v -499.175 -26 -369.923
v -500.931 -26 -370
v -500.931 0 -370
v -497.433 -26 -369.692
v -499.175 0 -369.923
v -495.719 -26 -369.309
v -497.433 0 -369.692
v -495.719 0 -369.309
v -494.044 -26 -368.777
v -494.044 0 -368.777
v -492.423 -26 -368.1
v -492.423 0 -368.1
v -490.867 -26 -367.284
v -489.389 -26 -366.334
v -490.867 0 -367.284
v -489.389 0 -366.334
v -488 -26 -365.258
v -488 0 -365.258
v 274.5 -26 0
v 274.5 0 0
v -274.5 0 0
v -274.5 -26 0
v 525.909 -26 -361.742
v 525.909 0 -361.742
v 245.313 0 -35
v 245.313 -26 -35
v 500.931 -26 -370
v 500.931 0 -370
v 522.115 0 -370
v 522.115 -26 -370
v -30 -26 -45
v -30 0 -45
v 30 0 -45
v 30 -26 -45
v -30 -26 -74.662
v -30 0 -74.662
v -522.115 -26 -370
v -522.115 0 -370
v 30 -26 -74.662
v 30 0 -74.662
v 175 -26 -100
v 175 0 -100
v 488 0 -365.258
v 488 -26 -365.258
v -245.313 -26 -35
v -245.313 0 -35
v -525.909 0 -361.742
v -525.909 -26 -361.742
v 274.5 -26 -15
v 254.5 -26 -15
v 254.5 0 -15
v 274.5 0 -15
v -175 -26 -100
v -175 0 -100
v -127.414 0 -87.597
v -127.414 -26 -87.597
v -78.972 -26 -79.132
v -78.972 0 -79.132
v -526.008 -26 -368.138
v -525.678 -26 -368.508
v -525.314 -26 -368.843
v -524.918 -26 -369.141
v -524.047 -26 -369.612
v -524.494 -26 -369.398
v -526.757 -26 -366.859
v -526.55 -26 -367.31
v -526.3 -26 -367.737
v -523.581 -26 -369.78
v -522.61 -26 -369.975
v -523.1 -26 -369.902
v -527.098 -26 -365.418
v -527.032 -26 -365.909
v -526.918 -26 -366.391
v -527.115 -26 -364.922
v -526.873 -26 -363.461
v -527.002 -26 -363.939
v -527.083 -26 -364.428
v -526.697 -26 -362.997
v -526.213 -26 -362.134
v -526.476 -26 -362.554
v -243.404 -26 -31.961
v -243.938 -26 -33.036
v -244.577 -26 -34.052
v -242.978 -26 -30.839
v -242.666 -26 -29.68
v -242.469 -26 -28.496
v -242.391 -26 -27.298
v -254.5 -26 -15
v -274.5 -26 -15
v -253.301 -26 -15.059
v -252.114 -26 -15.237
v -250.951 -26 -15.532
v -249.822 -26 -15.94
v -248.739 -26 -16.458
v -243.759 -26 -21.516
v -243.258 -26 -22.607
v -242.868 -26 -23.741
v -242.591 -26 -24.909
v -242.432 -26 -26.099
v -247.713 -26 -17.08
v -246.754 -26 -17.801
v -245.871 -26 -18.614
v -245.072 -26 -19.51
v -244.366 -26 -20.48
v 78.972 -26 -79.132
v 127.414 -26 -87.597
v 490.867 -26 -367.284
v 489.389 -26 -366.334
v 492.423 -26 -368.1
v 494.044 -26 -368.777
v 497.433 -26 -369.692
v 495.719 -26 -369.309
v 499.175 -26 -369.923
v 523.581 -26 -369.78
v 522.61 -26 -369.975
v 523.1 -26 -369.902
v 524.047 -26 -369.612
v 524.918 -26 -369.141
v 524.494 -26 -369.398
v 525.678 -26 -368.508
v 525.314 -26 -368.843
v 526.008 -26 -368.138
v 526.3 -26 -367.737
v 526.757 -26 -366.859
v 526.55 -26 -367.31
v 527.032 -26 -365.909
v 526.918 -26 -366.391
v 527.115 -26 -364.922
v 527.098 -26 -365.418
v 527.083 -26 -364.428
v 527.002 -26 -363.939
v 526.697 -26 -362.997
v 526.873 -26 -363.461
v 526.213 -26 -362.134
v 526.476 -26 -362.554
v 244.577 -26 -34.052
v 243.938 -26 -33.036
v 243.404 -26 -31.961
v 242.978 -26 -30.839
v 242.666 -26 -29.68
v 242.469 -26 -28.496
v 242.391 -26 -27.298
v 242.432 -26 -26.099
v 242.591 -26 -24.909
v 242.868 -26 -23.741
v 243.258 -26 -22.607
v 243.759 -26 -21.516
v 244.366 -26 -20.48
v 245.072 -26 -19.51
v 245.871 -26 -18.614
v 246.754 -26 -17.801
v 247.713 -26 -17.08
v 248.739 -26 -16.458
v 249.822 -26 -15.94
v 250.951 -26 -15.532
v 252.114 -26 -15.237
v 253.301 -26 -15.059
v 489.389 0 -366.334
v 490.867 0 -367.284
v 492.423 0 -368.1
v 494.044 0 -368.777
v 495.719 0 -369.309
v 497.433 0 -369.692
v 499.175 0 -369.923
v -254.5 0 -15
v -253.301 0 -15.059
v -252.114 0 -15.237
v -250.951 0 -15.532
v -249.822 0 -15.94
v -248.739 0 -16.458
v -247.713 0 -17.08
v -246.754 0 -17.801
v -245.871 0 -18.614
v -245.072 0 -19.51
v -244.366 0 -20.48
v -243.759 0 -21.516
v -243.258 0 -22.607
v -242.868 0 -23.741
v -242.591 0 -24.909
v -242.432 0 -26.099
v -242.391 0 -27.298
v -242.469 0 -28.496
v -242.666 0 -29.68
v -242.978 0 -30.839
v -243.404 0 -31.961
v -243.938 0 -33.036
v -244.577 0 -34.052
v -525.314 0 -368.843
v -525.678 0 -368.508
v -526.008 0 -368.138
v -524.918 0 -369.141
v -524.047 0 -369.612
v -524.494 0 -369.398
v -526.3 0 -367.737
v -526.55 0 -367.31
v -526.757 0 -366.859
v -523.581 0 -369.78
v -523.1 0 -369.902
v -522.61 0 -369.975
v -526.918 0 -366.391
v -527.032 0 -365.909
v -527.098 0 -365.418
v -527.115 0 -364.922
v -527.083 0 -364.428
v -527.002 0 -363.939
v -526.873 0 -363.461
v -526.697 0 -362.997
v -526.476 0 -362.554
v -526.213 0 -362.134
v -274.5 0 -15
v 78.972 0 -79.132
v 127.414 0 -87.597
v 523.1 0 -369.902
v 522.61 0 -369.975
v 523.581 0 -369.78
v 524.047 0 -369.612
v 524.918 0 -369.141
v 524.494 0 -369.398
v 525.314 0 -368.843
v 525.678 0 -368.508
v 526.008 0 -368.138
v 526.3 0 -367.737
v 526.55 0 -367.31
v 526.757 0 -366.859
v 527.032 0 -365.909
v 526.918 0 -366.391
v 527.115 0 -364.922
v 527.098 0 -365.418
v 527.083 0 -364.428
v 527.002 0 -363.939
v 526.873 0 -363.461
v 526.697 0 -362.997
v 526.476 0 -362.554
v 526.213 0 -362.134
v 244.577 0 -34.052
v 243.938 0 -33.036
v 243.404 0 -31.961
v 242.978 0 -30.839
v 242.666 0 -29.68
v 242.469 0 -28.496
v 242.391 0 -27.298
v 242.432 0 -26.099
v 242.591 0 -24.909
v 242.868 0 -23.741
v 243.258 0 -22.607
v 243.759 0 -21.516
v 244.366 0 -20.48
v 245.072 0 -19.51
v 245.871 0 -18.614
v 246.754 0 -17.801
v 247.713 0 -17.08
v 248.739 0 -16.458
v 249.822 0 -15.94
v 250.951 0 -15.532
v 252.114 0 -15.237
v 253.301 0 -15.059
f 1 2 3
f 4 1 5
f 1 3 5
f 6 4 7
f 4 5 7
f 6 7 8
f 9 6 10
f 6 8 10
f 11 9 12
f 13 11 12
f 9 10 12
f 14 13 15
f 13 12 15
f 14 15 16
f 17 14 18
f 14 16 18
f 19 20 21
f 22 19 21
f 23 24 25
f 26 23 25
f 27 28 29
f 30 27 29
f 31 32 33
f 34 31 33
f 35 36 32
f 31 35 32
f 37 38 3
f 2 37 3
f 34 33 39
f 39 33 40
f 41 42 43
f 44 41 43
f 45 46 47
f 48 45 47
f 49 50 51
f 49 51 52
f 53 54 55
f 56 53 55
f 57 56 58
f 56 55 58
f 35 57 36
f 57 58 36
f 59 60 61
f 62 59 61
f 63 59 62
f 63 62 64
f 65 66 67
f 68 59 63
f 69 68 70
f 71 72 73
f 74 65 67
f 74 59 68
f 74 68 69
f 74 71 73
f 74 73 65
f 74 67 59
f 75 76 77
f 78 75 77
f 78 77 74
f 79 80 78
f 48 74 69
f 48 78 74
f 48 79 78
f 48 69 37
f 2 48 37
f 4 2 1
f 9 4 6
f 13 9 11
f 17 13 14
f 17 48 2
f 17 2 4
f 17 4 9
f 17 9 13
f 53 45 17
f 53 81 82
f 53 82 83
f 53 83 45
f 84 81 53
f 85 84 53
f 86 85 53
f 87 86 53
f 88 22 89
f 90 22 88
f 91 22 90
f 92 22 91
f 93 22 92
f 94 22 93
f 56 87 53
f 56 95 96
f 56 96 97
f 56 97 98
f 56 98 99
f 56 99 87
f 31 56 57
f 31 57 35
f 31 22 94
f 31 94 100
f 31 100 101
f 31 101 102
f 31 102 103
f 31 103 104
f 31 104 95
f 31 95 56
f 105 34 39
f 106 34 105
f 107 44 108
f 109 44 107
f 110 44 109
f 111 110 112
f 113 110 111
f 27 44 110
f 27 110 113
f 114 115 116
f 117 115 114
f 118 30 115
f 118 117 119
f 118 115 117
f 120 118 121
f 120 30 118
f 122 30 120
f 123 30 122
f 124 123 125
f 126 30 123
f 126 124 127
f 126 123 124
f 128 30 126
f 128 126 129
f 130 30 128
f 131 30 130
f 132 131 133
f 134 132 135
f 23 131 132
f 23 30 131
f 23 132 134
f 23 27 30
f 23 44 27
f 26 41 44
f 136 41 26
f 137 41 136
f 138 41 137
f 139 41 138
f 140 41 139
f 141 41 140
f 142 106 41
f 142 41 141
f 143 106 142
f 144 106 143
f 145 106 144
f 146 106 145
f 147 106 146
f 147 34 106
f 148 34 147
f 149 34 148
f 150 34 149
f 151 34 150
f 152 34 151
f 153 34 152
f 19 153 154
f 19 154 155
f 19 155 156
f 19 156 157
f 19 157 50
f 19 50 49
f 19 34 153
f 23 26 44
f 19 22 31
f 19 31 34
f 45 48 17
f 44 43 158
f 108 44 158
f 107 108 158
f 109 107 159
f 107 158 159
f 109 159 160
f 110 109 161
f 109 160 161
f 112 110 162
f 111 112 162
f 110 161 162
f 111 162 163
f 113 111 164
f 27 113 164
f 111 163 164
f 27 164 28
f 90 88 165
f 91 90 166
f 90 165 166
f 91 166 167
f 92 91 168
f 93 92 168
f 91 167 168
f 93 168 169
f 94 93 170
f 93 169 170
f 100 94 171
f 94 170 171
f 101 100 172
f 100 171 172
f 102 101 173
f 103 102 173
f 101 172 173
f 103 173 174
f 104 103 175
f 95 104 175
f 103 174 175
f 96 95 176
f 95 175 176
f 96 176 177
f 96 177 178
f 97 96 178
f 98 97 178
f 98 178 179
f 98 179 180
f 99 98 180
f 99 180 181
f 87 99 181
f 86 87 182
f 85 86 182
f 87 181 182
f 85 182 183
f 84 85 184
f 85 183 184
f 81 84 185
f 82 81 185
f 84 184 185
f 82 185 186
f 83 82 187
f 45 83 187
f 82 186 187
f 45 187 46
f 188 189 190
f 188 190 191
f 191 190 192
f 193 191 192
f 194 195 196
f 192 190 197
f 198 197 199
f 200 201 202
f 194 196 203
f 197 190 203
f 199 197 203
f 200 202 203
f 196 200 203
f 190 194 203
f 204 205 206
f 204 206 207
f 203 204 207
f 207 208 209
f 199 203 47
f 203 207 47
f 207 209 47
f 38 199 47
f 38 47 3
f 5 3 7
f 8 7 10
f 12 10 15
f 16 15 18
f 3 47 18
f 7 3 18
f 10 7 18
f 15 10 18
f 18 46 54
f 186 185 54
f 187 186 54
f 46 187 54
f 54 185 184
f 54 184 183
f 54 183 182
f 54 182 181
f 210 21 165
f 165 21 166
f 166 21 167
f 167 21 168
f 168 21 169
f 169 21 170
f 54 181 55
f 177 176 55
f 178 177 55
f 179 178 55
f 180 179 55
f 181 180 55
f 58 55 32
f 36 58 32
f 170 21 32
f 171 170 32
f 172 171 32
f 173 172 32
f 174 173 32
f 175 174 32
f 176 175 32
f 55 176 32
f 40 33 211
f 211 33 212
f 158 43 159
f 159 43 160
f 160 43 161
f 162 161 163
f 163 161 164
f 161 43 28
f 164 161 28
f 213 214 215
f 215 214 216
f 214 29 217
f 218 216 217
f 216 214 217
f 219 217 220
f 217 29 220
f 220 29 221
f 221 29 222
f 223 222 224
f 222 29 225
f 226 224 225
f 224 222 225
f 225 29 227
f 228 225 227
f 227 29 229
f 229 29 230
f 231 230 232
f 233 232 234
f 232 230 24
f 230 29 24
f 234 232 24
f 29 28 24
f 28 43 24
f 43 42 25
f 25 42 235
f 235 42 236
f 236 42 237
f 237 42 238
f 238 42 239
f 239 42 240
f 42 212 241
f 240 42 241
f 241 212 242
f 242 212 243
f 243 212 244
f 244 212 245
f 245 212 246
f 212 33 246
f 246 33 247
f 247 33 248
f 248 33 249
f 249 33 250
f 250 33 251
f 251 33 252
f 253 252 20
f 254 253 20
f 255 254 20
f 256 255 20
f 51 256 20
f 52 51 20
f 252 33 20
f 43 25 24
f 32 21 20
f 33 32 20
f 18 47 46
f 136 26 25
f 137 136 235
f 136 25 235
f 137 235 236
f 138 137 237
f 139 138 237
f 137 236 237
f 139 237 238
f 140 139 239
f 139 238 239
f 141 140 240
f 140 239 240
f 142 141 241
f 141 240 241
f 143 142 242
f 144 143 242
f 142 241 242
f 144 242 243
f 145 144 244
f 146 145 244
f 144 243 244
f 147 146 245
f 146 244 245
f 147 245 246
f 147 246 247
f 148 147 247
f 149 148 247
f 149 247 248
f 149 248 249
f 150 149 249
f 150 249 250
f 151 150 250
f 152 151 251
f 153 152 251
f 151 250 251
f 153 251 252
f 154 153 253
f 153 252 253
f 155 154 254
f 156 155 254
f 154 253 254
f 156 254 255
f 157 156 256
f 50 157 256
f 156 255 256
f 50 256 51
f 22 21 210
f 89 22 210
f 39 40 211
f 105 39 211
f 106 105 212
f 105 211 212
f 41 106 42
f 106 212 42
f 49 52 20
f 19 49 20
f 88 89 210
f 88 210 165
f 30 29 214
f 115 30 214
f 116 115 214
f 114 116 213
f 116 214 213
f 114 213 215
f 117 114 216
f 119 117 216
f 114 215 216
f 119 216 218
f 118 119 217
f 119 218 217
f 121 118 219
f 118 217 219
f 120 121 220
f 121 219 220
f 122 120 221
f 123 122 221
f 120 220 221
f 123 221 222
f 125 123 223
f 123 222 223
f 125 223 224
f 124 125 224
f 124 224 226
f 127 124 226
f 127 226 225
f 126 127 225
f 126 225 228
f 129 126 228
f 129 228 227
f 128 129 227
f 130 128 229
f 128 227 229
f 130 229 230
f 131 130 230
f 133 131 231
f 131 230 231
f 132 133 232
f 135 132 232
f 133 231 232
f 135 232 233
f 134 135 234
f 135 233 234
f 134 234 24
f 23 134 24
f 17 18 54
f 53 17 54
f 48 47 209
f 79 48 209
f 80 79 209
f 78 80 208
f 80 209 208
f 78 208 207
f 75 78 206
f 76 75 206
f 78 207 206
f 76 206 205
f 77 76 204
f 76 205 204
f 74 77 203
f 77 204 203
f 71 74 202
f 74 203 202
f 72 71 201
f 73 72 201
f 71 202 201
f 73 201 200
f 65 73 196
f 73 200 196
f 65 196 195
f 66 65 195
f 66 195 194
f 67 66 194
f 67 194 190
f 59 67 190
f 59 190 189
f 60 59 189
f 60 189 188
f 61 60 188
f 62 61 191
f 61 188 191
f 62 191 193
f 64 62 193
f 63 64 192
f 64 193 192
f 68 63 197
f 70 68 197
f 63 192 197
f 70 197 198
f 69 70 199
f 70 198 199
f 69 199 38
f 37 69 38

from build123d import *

# Parameters (mm, degrees)
F1_DEPTH = 26


with BuildPart() as f1:
    # F0 (on Front) → F1 (new body)
    with BuildSketch(Plane.XZ):
        with BuildLine():
            ThreePointArc((522.115478, -370), (526.65902, -367.087157), (525.908713, -361.74249))
            Line((525.908713, -361.74249), (245.312642, -35))
            ThreePointArc((245.312642, -35), (243.49537, -22.055015), (254.5, -15))
            Line((254.5, -15), (274.5, -15))
            Line((274.5, -15), (274.5, 0))
            Line((274.5, 0), (-274.5, 0))
            Line((-274.5, 0), (-274.5, -15))
            Line((-274.5, -15), (-254.5, -15))
            ThreePointArc((-254.5, -15), (-243.49537, -22.055015), (-245.312642, -35))
            Line((-245.312642, -35), (-525.908713, -361.74249))
            ThreePointArc((-525.908713, -361.74249), (-526.65902, -367.087157), (-522.115478, -370))
            Line((-522.115478, -370), (-500.930536, -370))
            ThreePointArc((-500.930536, -370), (-494.044191, -368.777067), (-488, -365.257826))
            Line((-488, -365.257826), (-175, -100))
            ThreePointArc((-175, -100), (-103.279947, -82.867809), (-30, -74.662483))
            Line((-30, -74.662483), (-30, -45))
            Line((-30, -45), (30, -45))
            Line((30, -45), (30, -74.662483))
            ThreePointArc((30, -74.662483), (103.279947, -82.867809), (175, -100))
            Line((175, -100), (488, -365.257826))
            ThreePointArc((488, -365.257826), (494.044191, -368.777067), (500.930536, -370))
            Line((500.930536, -370), (522.115478, -370))
        make_face()
    extrude(amount=F1_DEPTH)


solid = f1.part
